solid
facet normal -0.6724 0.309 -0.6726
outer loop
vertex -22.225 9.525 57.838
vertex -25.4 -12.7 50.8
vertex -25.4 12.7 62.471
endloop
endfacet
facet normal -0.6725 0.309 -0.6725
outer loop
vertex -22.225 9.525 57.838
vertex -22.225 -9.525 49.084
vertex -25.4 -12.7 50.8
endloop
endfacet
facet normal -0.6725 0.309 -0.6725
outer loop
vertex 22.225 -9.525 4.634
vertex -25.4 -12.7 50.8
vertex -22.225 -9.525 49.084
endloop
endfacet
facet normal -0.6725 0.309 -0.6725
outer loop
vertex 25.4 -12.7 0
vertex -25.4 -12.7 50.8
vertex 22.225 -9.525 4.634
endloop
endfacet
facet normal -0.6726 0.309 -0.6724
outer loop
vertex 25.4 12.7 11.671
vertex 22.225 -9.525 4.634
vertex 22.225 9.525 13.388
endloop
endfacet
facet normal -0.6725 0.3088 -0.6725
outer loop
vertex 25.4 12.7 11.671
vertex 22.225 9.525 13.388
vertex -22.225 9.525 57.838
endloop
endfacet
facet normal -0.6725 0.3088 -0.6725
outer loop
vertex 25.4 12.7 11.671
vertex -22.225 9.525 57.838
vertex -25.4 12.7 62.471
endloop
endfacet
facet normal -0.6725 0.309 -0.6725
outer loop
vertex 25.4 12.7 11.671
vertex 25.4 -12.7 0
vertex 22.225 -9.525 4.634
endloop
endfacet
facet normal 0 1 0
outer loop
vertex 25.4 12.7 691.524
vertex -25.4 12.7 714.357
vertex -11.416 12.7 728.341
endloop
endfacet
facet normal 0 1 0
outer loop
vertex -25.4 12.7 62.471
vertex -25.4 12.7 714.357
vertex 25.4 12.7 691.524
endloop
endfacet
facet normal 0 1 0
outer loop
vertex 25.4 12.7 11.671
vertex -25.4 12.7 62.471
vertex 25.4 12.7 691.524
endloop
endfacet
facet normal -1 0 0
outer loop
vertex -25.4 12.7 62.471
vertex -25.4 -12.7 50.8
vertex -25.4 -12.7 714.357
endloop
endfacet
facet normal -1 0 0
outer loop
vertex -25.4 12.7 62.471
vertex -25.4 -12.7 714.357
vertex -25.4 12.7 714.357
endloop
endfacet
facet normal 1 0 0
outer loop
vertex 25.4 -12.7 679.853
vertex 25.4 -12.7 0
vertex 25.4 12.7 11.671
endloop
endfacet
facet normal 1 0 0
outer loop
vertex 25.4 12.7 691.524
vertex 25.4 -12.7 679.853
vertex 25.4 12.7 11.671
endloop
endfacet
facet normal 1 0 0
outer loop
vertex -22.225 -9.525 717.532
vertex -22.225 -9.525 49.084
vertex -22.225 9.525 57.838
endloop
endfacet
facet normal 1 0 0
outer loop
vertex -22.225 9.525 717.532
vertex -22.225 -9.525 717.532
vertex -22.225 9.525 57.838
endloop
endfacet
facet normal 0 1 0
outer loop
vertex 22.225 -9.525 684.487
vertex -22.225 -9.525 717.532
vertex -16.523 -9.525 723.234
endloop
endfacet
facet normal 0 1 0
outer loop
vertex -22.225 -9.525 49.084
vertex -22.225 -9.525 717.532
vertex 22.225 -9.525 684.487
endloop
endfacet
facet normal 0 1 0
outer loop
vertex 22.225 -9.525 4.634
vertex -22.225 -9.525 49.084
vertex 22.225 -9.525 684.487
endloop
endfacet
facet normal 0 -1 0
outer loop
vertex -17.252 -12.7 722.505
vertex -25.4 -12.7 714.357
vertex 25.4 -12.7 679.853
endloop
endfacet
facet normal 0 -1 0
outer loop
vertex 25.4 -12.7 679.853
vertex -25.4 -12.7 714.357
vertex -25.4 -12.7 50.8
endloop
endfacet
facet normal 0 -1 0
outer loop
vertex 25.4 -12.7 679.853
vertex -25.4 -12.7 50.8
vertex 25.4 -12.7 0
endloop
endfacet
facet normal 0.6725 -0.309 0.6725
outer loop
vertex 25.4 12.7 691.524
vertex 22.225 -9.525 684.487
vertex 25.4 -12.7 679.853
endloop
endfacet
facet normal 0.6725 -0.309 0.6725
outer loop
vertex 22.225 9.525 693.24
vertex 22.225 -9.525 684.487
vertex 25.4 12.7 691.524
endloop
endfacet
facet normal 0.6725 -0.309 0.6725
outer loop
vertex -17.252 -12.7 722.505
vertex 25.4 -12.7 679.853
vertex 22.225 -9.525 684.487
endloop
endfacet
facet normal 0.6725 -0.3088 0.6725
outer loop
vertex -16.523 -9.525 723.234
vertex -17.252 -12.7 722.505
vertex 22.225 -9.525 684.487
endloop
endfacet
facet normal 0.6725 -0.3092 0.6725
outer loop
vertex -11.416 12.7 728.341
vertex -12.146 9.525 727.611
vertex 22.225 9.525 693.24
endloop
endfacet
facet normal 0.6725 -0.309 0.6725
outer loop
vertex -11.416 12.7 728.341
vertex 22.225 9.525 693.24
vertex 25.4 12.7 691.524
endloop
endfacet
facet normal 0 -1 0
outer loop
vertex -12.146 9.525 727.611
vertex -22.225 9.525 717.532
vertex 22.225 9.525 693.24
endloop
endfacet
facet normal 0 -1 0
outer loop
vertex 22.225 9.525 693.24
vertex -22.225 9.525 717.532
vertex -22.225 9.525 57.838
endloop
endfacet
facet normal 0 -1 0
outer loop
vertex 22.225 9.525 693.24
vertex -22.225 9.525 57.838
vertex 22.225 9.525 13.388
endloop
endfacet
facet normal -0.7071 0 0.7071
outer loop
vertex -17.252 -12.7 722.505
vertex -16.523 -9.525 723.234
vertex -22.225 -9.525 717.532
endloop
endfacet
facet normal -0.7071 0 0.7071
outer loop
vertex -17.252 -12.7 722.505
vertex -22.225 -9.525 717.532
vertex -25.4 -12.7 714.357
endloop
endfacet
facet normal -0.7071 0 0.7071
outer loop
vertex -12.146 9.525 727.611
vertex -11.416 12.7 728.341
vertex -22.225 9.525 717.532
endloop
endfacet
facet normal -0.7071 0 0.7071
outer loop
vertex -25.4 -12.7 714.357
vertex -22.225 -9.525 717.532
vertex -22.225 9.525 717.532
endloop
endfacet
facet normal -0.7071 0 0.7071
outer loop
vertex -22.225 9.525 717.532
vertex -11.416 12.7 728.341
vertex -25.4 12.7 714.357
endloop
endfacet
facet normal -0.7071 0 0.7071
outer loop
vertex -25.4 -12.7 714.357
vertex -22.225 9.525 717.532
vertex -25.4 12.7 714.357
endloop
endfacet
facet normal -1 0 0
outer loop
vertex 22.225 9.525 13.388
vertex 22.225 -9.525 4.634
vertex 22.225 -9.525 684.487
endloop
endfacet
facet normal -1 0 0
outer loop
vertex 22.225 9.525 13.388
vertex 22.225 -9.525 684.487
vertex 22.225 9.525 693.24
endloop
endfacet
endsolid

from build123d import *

# Parameters (mm, degrees)
SKETCH1_W                = 50.8
SKETCH1_H                = 25.4
SKETCH1_W_2              = 44.45
SKETCH1_H_2              = 19.05
BOSS_EXTRUDE1_DEPTH      = 771.9314
CUT_EXTRUDE1_DEPTH       = 773.76672179
SKETCH10_W               = 90.356784756
SKETCH10_H               = 129.906903396
CUT_EXTRUDE8_DEPTH       = 40.64
CUT_EXTRUDE9_DEPTH       = 1230.239509376
CUT_EXTRUDE10_DEPTH      = 567.92953801
CUT_EXTRUDE10_DEPTH_BACK = 567.92953801


with BuildPart() as part:
    # Sketch1 → Boss-Extrude1 (new body)
    with BuildSketch(Plane.XY):
        Rectangle(SKETCH1_W, SKETCH1_H)
        Rectangle(SKETCH1_W_2, SKETCH1_H_2, mode=Mode.SUBTRACT)
    extrude(amount=BOSS_EXTRUDE1_DEPTH)

    # Sketch2 → Cut-Extrude1 (cut, through all)
    with BuildSketch(Plane(origin=(0, 12.7, 0), x_dir=(1, 0, 0), z_dir=(0, 1, 0))):
        Polygon((25.4, 0), (-25.4, -50.8), (-25.4, 0), align=None)
        Polygon((-25.4, -771.9314), (25.4, -721.1314), (25.4, -771.9314), align=None)
    extrude(amount=-CUT_EXTRUDE1_DEPTH, mode=Mode.SUBTRACT)

    # Sketch10 → Cut-Extrude8 (cut)
    with BuildSketch(Plane(origin=(-369.87845504, 0, 369.87845504), x_dir=(-0.7071067811865528, 0, -0.7071067811865422), z_dir=(0.7071067811865422, 0, -0.7071067811865528))):
        with Locations((-494.442187508, 23.675993241)):
            Rectangle(SKETCH10_W, SKETCH10_H)
    extrude(amount=-CUT_EXTRUDE8_DEPTH, mode=Mode.SUBTRACT)


with BuildPart() as cut_extrude8_piece_1:
    # of the separate pieces the step leaves, piece 1, a body of its own (cut_extrude8_pieces)
    add(part.part.solids().sort_by_distance((25.4, -12.7, 0))[0])

    # Sketch11 → Cut-Extrude9 (cut, through all)
    with BuildSketch(Plane(origin=(386.259110354, 0, -386.259110354), x_dir=(-0.7071067811865541, -3.472433466129024e-15, -0.7071067811865409), z_dir=(0.7071067811865409, -3.4724334661290888e-15, -0.7071067811865541))):
        Polygon((-17.960512242, -12.7), (-26.213472526, 12.7), (-17.960512242, 12.7), align=None)
    extrude(amount=-CUT_EXTRUDE9_DEPTH, mode=Mode.SUBTRACT)


with BuildPart() as cut_extrude8_piece_2:
    # of the separate pieces the step leaves, piece 2, a body of its own (cut_extrude8_pieces)
    add(part.part.solids().sort_by_distance((-25.349574627, -12.7, 771.880974627))[0])


with BuildPart() as cut_extrude10_tool:
    # Sketch12 → Cut-Extrude10 (new, two sides: drawn at the far end of the back side and taken through both)
    with BuildSketch(Plane(origin=(-332.161379331, 0, 332.161379331), x_dir=(-0.7071067811865526, 0, -0.7071067811865425), z_dir=(0.7071067811865425, 0, -0.7071067811865526)).offset(-CUT_EXTRUDE10_DEPTH_BACK)):
        Polygon((-498.689041164, -12.7), (-506.942001448, 12.7), (-527.877415309, 12.7), (-527.877415309, -12.7), align=None)
    extrude(amount=CUT_EXTRUDE10_DEPTH + CUT_EXTRUDE10_DEPTH_BACK)


with BuildPart() as cut_extrude8_piece_1_1:
    add(cut_extrude8_piece_1.part)

    # Cut-Extrude10: cut by cut_extrude10_tool
    add(cut_extrude10_tool.part, mode=Mode.SUBTRACT)


with BuildPart() as cut_extrude8_piece_2_1:
    add(cut_extrude8_piece_2.part)

    # Cut-Extrude10: cut by cut_extrude10_tool
    add(cut_extrude10_tool.part, mode=Mode.SUBTRACT)


solid = cut_extrude8_piece_1_1.part
